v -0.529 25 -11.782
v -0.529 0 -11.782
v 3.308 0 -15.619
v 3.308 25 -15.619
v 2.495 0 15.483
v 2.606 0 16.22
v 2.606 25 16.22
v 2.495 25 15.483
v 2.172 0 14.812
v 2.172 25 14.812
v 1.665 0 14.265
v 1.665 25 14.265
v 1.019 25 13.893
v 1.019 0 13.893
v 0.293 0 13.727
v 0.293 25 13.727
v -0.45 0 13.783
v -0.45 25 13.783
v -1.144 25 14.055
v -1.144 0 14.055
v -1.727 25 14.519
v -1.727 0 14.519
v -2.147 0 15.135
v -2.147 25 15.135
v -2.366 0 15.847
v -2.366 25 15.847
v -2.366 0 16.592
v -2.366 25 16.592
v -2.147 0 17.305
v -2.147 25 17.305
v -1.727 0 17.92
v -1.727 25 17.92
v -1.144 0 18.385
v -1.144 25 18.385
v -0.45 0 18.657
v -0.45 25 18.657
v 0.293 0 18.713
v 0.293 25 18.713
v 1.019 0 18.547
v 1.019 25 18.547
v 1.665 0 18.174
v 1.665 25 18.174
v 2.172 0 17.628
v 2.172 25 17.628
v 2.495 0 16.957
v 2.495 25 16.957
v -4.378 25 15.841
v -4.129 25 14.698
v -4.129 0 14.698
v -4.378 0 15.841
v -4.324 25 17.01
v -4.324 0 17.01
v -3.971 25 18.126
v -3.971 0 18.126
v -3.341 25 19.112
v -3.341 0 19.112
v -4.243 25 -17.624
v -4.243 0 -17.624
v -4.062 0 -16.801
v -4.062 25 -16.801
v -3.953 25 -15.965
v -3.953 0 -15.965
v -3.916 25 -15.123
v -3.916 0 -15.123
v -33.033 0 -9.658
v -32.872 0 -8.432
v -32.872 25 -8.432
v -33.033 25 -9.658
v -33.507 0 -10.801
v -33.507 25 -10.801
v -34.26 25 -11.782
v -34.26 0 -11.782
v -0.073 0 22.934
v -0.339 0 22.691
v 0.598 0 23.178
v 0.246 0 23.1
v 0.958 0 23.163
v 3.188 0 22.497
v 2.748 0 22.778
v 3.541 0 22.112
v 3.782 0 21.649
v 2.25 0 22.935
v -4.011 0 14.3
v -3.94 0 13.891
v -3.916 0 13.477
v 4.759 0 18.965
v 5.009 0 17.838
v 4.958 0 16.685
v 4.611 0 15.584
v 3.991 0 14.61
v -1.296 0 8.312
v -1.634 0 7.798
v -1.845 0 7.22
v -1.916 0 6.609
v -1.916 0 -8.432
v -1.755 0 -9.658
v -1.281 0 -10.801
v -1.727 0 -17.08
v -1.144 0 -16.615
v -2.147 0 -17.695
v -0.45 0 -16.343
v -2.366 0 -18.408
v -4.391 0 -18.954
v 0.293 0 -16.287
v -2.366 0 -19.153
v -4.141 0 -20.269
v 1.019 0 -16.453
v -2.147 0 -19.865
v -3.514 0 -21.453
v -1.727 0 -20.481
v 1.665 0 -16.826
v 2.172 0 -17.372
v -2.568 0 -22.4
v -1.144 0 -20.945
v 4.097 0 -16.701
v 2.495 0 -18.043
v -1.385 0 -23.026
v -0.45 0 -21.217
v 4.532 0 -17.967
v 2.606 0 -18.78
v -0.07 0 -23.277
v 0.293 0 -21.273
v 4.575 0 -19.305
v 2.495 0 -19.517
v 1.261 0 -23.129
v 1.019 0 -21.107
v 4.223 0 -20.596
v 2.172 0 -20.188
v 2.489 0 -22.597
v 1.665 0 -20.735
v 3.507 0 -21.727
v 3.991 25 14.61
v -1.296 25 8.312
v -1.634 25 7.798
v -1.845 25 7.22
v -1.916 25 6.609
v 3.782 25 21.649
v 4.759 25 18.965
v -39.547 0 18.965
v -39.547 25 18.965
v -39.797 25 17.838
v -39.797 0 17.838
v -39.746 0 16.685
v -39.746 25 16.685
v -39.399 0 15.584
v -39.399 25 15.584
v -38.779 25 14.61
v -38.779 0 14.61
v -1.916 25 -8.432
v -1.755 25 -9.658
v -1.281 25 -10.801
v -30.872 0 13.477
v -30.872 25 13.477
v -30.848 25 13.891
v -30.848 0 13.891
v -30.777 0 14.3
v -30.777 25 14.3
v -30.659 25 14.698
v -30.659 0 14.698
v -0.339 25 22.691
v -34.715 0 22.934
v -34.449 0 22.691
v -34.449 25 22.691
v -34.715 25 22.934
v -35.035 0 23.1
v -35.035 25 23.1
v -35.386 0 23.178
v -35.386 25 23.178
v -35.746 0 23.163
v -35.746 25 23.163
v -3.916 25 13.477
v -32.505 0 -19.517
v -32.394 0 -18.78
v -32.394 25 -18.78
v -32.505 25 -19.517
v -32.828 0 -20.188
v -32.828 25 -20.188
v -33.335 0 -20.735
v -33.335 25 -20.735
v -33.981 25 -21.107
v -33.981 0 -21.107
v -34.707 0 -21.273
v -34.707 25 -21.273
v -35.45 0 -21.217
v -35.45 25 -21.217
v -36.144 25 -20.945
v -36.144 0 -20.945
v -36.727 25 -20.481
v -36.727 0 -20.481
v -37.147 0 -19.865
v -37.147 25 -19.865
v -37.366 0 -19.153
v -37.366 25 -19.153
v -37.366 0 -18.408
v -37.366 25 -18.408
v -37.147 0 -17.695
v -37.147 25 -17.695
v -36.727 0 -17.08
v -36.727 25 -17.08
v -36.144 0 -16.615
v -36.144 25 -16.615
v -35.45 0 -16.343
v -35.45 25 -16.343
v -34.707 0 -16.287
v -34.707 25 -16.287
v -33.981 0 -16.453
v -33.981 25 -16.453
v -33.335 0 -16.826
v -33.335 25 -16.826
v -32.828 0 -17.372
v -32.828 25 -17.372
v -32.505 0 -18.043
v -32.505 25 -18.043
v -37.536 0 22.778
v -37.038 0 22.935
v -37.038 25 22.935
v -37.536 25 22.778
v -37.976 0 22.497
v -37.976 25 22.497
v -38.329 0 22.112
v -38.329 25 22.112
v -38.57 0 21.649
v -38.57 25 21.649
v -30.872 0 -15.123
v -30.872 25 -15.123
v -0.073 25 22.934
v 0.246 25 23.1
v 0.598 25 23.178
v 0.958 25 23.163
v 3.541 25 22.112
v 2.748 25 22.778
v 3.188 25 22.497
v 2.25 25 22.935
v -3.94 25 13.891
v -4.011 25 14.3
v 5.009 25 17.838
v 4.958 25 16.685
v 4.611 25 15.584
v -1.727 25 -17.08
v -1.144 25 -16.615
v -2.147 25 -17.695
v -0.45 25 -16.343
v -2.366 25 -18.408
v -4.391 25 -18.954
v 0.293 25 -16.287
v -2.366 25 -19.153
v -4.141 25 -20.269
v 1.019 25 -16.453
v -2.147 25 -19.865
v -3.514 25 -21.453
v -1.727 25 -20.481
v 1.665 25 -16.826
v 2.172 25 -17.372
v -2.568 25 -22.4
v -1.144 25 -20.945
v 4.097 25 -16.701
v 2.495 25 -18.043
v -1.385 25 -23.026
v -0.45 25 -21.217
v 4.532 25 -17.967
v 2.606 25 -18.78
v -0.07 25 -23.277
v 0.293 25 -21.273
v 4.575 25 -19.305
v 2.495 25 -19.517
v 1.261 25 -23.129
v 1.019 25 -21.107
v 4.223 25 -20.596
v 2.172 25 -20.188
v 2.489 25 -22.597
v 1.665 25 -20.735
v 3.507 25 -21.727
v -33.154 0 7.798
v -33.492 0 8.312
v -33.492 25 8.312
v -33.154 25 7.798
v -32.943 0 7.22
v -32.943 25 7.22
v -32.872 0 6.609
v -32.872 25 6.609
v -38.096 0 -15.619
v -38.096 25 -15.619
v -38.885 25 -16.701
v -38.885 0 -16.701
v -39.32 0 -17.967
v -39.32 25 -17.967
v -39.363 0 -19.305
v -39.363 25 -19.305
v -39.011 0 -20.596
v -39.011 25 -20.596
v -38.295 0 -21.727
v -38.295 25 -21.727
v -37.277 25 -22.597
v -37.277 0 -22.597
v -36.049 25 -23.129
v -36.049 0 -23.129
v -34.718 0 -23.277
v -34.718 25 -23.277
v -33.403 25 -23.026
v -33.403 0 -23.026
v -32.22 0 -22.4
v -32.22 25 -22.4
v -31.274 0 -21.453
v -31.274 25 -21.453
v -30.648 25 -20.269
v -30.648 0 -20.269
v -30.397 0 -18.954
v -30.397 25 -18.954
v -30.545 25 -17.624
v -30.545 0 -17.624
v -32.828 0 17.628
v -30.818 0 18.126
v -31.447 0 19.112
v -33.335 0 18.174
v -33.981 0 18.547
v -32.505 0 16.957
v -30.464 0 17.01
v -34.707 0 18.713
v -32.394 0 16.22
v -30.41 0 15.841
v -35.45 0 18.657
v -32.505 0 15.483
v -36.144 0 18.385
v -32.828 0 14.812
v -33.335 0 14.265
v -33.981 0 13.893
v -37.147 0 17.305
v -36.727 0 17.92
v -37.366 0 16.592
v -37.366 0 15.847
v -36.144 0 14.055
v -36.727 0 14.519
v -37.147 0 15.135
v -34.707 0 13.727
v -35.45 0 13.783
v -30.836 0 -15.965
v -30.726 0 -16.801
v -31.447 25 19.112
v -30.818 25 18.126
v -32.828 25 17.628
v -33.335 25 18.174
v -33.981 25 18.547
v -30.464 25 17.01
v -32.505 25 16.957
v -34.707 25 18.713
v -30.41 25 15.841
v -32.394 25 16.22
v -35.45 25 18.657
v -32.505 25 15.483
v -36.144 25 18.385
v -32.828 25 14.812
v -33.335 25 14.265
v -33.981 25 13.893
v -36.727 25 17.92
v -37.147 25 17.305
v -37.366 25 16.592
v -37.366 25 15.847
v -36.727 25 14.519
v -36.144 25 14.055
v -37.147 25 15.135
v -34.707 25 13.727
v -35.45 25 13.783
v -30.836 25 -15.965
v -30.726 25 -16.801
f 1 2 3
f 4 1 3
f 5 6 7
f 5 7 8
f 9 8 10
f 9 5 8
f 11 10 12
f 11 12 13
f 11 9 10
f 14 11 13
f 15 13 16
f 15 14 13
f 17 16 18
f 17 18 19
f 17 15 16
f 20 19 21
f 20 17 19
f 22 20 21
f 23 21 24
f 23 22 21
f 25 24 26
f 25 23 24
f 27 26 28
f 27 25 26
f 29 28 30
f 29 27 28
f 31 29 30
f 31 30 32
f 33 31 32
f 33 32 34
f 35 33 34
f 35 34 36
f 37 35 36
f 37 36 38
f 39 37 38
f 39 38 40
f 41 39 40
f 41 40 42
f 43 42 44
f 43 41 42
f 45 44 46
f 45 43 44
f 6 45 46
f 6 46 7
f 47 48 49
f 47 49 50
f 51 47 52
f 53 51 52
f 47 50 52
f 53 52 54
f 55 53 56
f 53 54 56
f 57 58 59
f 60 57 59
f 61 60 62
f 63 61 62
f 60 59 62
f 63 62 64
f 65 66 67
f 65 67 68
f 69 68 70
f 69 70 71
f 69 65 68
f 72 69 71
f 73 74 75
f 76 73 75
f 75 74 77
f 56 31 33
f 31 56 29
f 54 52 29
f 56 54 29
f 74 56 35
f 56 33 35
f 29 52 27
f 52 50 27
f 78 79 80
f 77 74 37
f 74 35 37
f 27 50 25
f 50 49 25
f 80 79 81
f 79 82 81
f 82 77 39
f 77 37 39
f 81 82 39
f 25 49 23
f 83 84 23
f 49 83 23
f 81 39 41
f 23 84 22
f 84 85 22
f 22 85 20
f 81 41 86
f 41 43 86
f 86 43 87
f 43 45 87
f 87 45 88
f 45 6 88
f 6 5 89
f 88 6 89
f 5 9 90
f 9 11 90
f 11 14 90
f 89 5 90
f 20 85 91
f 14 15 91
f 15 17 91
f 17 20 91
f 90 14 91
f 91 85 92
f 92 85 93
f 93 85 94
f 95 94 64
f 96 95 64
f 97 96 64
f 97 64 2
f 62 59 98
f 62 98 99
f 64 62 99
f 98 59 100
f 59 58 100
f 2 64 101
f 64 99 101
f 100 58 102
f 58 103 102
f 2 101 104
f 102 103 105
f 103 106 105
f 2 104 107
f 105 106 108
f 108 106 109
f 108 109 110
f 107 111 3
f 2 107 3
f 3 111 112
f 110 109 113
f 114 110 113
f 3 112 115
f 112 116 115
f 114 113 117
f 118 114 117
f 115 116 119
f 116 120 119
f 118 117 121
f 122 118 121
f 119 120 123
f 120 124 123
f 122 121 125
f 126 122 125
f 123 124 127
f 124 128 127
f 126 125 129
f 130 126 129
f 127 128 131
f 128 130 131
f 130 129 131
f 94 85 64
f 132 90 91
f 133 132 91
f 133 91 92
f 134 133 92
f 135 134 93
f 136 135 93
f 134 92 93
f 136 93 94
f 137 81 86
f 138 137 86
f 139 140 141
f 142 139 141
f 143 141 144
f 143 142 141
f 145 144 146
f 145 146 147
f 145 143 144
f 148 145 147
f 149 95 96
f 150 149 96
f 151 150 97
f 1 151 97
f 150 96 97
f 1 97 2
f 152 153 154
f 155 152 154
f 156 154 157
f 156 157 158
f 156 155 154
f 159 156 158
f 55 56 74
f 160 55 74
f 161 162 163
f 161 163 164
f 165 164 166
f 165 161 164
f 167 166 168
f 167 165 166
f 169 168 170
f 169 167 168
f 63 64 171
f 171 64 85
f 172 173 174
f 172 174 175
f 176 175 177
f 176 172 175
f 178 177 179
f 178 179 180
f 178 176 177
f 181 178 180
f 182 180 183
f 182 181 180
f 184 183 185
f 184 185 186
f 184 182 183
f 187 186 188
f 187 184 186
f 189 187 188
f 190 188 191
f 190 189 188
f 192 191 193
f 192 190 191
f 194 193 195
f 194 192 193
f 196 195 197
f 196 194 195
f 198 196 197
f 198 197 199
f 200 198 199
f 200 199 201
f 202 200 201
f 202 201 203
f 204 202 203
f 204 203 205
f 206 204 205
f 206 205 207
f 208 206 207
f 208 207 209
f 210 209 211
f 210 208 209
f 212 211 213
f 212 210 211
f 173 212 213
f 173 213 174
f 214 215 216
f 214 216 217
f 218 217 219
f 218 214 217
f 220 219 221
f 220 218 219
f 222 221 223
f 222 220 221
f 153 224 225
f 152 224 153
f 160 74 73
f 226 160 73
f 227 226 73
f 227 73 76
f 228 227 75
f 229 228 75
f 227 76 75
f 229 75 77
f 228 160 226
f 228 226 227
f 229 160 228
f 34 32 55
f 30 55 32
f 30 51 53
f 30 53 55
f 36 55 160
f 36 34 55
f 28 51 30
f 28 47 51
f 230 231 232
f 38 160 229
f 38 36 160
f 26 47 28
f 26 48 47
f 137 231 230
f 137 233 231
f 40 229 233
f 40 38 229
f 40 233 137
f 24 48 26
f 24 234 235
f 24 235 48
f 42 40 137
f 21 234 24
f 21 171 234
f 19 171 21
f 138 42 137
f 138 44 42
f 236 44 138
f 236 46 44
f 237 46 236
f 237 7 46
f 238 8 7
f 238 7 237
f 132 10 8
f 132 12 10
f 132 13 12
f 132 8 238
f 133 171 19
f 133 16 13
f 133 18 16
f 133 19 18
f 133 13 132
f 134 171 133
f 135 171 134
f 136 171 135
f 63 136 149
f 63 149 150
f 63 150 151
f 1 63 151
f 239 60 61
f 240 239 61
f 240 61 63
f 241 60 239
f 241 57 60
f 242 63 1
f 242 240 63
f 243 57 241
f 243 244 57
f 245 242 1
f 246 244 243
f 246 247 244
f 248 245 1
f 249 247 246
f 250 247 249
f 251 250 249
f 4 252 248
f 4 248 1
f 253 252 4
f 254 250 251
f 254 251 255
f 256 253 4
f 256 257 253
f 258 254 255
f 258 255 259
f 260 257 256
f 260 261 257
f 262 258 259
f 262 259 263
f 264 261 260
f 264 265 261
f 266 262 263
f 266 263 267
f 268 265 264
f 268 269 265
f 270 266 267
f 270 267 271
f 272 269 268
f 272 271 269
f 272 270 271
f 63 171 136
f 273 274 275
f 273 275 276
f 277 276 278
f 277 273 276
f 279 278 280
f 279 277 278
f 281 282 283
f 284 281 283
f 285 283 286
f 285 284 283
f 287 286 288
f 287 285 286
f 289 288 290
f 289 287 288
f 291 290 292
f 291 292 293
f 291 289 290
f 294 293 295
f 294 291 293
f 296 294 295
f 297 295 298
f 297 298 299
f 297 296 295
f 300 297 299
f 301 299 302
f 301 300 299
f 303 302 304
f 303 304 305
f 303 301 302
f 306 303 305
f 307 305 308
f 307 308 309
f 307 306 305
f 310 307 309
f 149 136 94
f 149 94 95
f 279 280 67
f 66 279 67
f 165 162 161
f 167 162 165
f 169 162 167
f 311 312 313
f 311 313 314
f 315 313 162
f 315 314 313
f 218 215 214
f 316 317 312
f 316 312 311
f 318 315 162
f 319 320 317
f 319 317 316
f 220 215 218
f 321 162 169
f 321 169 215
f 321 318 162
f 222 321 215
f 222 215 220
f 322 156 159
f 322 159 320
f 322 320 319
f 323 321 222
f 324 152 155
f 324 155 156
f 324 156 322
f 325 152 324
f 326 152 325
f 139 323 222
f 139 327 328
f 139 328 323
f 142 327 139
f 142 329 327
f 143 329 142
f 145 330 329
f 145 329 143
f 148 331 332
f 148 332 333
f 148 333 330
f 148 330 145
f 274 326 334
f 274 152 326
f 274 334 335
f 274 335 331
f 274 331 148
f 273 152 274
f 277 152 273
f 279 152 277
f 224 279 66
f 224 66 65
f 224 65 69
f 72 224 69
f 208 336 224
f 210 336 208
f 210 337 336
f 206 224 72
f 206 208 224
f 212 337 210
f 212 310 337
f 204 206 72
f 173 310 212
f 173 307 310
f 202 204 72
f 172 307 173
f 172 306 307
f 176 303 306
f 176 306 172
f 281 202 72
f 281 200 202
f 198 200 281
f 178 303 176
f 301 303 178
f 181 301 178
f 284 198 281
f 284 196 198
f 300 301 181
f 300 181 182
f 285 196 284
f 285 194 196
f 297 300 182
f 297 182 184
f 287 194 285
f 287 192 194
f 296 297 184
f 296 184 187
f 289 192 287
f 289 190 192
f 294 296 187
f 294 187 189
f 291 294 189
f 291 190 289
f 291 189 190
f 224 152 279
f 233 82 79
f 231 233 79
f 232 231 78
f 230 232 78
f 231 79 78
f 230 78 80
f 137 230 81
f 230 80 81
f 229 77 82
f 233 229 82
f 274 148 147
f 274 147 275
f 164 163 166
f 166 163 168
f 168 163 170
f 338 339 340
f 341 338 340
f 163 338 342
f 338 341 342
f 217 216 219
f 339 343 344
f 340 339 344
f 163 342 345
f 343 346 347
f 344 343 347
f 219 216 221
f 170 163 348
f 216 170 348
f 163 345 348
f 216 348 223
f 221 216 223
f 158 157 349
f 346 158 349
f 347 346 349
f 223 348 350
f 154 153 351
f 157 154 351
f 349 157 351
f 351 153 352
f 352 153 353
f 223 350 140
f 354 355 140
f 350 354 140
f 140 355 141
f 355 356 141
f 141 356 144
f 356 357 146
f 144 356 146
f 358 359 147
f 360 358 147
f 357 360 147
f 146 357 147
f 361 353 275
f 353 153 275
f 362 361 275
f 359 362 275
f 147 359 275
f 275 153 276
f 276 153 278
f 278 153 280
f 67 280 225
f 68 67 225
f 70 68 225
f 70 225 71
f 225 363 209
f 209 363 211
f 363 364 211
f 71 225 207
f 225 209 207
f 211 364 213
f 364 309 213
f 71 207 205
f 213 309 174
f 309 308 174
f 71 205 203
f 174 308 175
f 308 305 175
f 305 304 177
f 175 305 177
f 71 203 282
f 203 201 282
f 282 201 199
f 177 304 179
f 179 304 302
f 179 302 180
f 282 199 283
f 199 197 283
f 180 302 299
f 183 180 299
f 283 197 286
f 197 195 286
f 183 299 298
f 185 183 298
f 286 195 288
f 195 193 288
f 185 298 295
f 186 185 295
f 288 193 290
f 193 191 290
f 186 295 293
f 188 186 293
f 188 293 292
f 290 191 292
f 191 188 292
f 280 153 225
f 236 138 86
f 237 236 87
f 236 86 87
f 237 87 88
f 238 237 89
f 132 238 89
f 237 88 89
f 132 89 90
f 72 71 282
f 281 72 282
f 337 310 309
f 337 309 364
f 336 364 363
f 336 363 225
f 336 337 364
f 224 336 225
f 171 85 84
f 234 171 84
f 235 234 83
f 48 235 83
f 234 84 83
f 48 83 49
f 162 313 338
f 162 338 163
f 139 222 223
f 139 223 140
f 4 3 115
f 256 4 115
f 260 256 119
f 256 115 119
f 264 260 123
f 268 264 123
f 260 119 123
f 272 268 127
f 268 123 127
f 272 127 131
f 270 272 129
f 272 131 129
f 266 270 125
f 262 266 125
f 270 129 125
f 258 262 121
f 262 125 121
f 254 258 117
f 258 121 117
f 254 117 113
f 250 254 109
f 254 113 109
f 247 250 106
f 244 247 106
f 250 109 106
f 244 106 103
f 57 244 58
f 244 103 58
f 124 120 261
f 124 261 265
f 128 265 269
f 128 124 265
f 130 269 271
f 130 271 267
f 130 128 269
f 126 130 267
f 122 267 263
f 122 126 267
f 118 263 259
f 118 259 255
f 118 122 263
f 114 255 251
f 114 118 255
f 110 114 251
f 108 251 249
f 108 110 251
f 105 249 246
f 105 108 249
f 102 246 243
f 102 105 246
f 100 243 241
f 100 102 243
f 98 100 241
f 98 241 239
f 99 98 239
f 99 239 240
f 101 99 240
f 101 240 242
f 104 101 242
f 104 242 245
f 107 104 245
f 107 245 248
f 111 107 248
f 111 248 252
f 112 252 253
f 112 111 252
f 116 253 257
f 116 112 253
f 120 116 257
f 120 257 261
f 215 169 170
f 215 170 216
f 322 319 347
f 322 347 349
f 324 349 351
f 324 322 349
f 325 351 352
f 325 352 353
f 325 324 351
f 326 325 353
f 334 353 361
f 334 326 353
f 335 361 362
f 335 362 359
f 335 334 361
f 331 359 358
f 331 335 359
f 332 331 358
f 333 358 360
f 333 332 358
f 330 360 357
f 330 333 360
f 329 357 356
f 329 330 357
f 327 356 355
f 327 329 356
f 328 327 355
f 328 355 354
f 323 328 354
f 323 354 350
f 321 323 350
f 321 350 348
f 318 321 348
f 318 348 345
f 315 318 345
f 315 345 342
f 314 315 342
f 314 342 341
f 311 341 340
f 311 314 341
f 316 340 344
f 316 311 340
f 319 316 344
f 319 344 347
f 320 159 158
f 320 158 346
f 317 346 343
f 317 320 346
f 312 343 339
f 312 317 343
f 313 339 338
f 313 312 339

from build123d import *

# Parameters (mm, degrees)
SKETCH1_R             = 2.5
BOSS_EXTRUDE1_DEPTH   = 25
BOSS_EXTRUDE1_2_DEPTH = 25


with BuildPart() as part:
    # Sketch1 → Boss-Extrude1 (new body)
    with BuildSketch(Plane(origin=(0, 0, 0), x_dir=(1, 0, 0), z_dir=(0, 1, 0))):
        with BuildLine():
            Line((-3.341296497, -19.112401329), (-0.3389066, -22.6905175))
            ThreePointArc((-0.3389066, -22.6905175), (0.246348597, -23.100317695), (0.958094672, -23.162586214))
            Line((0.958094672, -23.162586214), (2.249788922, -22.934822271))
            ThreePointArc((2.249788922, -22.934822271), (3.188072996, -22.497290733), (3.781885701, -21.649235711))
            Line((3.781885701, -21.649235711), (4.758780701, -18.965229871))
            ThreePointArc((4.758780701, -18.965229871), (4.958196561, -16.68492284), (3.9905929, -14.610480748))
            Line((3.9905929, -14.610480748), (-1.296389221, -8.311556522))
            ThreePointArc((-1.296389221, -8.311556522), (-1.75637948, -7.515030148), (-1.916135173, -6.609202669))
            Line((-1.916135173, -6.609202669), (-1.916135173, 8.432064567))
            ThreePointArc((-1.916135173, 8.432064567), (-1.55553903, 10.244903795), (-0.528648097, 11.781754684))
            Line((-0.528648097, 11.781754684), (3.308214372, 15.618617153))
            ThreePointArc((3.308214372, 15.618617153), (1.260788565, 23.129420707), (-4.242964246, 17.623712083))
            ThreePointArc((-4.242964246, 17.623712083), (-3.998188362, 16.383912683), (-3.916135173, 15.122847633))
            Line((-3.916135173, 15.122847633), (-3.916135173, -13.477152367))
            ThreePointArc((-3.916135173, -13.477152367), (-3.969707578, -14.096623199), (-4.12883403, -14.697699638))
            ThreePointArc((-4.12883403, -14.697699638), (-4.32415693, -17.010138399), (-3.341296497, -19.112401329))
        make_face()
        with Locations((0.105906372, 18.780139488)):
            Circle(SKETCH1_R, mode=Mode.SUBTRACT)
        with Locations((0.105906372, -16.219860512)):
            Circle(SKETCH1_R, mode=Mode.SUBTRACT)
    extrude(amount=BOSS_EXTRUDE1_DEPTH)


with BuildPart() as body_2:
    # Sketch1 → Boss-Extrude1 2 (new body)
    with BuildSketch(Plane(origin=(0, 0, 0), x_dir=(1, 0, 0), z_dir=(0, 1, 0))):
        with BuildLine():
            Line((-30.872052083, 15.122847633), (-30.872052083, -13.477152367))
            ThreePointArc((-30.872052083, -13.477152367), (-30.818479677, -14.096623199), (-30.659353226, -14.697699638))
            ThreePointArc((-30.659353226, -14.697699638), (-30.464030325, -17.010138399), (-31.446890758, -19.112401329))
            Line((-31.446890758, -19.112401329), (-34.449280656, -22.6905175))
            ThreePointArc((-34.449280656, -22.6905175), (-35.034535852, -23.100317695), (-35.746281927, -23.162586214))
            Line((-35.746281927, -23.162586214), (-37.037976177, -22.934822271))
            ThreePointArc((-37.037976177, -22.934822271), (-37.976260251, -22.497290733), (-38.570072956, -21.649235711))
            Line((-38.570072956, -21.649235711), (-39.546967957, -18.965229871))
            ThreePointArc((-39.546967957, -18.965229871), (-39.746383816, -16.68492284), (-38.778780155, -14.610480748))
            Line((-38.778780155, -14.610480748), (-33.491798034, -8.311556522))
            ThreePointArc((-33.491798034, -8.311556522), (-33.031807776, -7.515030148), (-32.872052083, -6.609202669))
            Line((-32.872052083, -6.609202669), (-32.872052083, 8.432064567))
            ThreePointArc((-32.872052083, 8.432064567), (-33.232648225, 10.244903795), (-34.259539159, 11.781754684))
            Line((-34.259539159, 11.781754684), (-38.096401628, 15.618617153))
            ThreePointArc((-38.096401628, 15.618617153), (-36.04897582, 23.129420707), (-30.545223009, 17.623712083))
            ThreePointArc((-30.545223009, 17.623712083), (-30.789998893, 16.383912683), (-30.872052083, 15.122847633))
        make_face()
        with Locations((-34.894093628, -16.219860512)):
            Circle(SKETCH1_R, mode=Mode.SUBTRACT)
        with Locations((-34.894093628, 18.780139488)):
            Circle(SKETCH1_R, mode=Mode.SUBTRACT)
    extrude(amount=BOSS_EXTRUDE1_2_DEPTH)


solid = Compound([part.part, body_2.part])
